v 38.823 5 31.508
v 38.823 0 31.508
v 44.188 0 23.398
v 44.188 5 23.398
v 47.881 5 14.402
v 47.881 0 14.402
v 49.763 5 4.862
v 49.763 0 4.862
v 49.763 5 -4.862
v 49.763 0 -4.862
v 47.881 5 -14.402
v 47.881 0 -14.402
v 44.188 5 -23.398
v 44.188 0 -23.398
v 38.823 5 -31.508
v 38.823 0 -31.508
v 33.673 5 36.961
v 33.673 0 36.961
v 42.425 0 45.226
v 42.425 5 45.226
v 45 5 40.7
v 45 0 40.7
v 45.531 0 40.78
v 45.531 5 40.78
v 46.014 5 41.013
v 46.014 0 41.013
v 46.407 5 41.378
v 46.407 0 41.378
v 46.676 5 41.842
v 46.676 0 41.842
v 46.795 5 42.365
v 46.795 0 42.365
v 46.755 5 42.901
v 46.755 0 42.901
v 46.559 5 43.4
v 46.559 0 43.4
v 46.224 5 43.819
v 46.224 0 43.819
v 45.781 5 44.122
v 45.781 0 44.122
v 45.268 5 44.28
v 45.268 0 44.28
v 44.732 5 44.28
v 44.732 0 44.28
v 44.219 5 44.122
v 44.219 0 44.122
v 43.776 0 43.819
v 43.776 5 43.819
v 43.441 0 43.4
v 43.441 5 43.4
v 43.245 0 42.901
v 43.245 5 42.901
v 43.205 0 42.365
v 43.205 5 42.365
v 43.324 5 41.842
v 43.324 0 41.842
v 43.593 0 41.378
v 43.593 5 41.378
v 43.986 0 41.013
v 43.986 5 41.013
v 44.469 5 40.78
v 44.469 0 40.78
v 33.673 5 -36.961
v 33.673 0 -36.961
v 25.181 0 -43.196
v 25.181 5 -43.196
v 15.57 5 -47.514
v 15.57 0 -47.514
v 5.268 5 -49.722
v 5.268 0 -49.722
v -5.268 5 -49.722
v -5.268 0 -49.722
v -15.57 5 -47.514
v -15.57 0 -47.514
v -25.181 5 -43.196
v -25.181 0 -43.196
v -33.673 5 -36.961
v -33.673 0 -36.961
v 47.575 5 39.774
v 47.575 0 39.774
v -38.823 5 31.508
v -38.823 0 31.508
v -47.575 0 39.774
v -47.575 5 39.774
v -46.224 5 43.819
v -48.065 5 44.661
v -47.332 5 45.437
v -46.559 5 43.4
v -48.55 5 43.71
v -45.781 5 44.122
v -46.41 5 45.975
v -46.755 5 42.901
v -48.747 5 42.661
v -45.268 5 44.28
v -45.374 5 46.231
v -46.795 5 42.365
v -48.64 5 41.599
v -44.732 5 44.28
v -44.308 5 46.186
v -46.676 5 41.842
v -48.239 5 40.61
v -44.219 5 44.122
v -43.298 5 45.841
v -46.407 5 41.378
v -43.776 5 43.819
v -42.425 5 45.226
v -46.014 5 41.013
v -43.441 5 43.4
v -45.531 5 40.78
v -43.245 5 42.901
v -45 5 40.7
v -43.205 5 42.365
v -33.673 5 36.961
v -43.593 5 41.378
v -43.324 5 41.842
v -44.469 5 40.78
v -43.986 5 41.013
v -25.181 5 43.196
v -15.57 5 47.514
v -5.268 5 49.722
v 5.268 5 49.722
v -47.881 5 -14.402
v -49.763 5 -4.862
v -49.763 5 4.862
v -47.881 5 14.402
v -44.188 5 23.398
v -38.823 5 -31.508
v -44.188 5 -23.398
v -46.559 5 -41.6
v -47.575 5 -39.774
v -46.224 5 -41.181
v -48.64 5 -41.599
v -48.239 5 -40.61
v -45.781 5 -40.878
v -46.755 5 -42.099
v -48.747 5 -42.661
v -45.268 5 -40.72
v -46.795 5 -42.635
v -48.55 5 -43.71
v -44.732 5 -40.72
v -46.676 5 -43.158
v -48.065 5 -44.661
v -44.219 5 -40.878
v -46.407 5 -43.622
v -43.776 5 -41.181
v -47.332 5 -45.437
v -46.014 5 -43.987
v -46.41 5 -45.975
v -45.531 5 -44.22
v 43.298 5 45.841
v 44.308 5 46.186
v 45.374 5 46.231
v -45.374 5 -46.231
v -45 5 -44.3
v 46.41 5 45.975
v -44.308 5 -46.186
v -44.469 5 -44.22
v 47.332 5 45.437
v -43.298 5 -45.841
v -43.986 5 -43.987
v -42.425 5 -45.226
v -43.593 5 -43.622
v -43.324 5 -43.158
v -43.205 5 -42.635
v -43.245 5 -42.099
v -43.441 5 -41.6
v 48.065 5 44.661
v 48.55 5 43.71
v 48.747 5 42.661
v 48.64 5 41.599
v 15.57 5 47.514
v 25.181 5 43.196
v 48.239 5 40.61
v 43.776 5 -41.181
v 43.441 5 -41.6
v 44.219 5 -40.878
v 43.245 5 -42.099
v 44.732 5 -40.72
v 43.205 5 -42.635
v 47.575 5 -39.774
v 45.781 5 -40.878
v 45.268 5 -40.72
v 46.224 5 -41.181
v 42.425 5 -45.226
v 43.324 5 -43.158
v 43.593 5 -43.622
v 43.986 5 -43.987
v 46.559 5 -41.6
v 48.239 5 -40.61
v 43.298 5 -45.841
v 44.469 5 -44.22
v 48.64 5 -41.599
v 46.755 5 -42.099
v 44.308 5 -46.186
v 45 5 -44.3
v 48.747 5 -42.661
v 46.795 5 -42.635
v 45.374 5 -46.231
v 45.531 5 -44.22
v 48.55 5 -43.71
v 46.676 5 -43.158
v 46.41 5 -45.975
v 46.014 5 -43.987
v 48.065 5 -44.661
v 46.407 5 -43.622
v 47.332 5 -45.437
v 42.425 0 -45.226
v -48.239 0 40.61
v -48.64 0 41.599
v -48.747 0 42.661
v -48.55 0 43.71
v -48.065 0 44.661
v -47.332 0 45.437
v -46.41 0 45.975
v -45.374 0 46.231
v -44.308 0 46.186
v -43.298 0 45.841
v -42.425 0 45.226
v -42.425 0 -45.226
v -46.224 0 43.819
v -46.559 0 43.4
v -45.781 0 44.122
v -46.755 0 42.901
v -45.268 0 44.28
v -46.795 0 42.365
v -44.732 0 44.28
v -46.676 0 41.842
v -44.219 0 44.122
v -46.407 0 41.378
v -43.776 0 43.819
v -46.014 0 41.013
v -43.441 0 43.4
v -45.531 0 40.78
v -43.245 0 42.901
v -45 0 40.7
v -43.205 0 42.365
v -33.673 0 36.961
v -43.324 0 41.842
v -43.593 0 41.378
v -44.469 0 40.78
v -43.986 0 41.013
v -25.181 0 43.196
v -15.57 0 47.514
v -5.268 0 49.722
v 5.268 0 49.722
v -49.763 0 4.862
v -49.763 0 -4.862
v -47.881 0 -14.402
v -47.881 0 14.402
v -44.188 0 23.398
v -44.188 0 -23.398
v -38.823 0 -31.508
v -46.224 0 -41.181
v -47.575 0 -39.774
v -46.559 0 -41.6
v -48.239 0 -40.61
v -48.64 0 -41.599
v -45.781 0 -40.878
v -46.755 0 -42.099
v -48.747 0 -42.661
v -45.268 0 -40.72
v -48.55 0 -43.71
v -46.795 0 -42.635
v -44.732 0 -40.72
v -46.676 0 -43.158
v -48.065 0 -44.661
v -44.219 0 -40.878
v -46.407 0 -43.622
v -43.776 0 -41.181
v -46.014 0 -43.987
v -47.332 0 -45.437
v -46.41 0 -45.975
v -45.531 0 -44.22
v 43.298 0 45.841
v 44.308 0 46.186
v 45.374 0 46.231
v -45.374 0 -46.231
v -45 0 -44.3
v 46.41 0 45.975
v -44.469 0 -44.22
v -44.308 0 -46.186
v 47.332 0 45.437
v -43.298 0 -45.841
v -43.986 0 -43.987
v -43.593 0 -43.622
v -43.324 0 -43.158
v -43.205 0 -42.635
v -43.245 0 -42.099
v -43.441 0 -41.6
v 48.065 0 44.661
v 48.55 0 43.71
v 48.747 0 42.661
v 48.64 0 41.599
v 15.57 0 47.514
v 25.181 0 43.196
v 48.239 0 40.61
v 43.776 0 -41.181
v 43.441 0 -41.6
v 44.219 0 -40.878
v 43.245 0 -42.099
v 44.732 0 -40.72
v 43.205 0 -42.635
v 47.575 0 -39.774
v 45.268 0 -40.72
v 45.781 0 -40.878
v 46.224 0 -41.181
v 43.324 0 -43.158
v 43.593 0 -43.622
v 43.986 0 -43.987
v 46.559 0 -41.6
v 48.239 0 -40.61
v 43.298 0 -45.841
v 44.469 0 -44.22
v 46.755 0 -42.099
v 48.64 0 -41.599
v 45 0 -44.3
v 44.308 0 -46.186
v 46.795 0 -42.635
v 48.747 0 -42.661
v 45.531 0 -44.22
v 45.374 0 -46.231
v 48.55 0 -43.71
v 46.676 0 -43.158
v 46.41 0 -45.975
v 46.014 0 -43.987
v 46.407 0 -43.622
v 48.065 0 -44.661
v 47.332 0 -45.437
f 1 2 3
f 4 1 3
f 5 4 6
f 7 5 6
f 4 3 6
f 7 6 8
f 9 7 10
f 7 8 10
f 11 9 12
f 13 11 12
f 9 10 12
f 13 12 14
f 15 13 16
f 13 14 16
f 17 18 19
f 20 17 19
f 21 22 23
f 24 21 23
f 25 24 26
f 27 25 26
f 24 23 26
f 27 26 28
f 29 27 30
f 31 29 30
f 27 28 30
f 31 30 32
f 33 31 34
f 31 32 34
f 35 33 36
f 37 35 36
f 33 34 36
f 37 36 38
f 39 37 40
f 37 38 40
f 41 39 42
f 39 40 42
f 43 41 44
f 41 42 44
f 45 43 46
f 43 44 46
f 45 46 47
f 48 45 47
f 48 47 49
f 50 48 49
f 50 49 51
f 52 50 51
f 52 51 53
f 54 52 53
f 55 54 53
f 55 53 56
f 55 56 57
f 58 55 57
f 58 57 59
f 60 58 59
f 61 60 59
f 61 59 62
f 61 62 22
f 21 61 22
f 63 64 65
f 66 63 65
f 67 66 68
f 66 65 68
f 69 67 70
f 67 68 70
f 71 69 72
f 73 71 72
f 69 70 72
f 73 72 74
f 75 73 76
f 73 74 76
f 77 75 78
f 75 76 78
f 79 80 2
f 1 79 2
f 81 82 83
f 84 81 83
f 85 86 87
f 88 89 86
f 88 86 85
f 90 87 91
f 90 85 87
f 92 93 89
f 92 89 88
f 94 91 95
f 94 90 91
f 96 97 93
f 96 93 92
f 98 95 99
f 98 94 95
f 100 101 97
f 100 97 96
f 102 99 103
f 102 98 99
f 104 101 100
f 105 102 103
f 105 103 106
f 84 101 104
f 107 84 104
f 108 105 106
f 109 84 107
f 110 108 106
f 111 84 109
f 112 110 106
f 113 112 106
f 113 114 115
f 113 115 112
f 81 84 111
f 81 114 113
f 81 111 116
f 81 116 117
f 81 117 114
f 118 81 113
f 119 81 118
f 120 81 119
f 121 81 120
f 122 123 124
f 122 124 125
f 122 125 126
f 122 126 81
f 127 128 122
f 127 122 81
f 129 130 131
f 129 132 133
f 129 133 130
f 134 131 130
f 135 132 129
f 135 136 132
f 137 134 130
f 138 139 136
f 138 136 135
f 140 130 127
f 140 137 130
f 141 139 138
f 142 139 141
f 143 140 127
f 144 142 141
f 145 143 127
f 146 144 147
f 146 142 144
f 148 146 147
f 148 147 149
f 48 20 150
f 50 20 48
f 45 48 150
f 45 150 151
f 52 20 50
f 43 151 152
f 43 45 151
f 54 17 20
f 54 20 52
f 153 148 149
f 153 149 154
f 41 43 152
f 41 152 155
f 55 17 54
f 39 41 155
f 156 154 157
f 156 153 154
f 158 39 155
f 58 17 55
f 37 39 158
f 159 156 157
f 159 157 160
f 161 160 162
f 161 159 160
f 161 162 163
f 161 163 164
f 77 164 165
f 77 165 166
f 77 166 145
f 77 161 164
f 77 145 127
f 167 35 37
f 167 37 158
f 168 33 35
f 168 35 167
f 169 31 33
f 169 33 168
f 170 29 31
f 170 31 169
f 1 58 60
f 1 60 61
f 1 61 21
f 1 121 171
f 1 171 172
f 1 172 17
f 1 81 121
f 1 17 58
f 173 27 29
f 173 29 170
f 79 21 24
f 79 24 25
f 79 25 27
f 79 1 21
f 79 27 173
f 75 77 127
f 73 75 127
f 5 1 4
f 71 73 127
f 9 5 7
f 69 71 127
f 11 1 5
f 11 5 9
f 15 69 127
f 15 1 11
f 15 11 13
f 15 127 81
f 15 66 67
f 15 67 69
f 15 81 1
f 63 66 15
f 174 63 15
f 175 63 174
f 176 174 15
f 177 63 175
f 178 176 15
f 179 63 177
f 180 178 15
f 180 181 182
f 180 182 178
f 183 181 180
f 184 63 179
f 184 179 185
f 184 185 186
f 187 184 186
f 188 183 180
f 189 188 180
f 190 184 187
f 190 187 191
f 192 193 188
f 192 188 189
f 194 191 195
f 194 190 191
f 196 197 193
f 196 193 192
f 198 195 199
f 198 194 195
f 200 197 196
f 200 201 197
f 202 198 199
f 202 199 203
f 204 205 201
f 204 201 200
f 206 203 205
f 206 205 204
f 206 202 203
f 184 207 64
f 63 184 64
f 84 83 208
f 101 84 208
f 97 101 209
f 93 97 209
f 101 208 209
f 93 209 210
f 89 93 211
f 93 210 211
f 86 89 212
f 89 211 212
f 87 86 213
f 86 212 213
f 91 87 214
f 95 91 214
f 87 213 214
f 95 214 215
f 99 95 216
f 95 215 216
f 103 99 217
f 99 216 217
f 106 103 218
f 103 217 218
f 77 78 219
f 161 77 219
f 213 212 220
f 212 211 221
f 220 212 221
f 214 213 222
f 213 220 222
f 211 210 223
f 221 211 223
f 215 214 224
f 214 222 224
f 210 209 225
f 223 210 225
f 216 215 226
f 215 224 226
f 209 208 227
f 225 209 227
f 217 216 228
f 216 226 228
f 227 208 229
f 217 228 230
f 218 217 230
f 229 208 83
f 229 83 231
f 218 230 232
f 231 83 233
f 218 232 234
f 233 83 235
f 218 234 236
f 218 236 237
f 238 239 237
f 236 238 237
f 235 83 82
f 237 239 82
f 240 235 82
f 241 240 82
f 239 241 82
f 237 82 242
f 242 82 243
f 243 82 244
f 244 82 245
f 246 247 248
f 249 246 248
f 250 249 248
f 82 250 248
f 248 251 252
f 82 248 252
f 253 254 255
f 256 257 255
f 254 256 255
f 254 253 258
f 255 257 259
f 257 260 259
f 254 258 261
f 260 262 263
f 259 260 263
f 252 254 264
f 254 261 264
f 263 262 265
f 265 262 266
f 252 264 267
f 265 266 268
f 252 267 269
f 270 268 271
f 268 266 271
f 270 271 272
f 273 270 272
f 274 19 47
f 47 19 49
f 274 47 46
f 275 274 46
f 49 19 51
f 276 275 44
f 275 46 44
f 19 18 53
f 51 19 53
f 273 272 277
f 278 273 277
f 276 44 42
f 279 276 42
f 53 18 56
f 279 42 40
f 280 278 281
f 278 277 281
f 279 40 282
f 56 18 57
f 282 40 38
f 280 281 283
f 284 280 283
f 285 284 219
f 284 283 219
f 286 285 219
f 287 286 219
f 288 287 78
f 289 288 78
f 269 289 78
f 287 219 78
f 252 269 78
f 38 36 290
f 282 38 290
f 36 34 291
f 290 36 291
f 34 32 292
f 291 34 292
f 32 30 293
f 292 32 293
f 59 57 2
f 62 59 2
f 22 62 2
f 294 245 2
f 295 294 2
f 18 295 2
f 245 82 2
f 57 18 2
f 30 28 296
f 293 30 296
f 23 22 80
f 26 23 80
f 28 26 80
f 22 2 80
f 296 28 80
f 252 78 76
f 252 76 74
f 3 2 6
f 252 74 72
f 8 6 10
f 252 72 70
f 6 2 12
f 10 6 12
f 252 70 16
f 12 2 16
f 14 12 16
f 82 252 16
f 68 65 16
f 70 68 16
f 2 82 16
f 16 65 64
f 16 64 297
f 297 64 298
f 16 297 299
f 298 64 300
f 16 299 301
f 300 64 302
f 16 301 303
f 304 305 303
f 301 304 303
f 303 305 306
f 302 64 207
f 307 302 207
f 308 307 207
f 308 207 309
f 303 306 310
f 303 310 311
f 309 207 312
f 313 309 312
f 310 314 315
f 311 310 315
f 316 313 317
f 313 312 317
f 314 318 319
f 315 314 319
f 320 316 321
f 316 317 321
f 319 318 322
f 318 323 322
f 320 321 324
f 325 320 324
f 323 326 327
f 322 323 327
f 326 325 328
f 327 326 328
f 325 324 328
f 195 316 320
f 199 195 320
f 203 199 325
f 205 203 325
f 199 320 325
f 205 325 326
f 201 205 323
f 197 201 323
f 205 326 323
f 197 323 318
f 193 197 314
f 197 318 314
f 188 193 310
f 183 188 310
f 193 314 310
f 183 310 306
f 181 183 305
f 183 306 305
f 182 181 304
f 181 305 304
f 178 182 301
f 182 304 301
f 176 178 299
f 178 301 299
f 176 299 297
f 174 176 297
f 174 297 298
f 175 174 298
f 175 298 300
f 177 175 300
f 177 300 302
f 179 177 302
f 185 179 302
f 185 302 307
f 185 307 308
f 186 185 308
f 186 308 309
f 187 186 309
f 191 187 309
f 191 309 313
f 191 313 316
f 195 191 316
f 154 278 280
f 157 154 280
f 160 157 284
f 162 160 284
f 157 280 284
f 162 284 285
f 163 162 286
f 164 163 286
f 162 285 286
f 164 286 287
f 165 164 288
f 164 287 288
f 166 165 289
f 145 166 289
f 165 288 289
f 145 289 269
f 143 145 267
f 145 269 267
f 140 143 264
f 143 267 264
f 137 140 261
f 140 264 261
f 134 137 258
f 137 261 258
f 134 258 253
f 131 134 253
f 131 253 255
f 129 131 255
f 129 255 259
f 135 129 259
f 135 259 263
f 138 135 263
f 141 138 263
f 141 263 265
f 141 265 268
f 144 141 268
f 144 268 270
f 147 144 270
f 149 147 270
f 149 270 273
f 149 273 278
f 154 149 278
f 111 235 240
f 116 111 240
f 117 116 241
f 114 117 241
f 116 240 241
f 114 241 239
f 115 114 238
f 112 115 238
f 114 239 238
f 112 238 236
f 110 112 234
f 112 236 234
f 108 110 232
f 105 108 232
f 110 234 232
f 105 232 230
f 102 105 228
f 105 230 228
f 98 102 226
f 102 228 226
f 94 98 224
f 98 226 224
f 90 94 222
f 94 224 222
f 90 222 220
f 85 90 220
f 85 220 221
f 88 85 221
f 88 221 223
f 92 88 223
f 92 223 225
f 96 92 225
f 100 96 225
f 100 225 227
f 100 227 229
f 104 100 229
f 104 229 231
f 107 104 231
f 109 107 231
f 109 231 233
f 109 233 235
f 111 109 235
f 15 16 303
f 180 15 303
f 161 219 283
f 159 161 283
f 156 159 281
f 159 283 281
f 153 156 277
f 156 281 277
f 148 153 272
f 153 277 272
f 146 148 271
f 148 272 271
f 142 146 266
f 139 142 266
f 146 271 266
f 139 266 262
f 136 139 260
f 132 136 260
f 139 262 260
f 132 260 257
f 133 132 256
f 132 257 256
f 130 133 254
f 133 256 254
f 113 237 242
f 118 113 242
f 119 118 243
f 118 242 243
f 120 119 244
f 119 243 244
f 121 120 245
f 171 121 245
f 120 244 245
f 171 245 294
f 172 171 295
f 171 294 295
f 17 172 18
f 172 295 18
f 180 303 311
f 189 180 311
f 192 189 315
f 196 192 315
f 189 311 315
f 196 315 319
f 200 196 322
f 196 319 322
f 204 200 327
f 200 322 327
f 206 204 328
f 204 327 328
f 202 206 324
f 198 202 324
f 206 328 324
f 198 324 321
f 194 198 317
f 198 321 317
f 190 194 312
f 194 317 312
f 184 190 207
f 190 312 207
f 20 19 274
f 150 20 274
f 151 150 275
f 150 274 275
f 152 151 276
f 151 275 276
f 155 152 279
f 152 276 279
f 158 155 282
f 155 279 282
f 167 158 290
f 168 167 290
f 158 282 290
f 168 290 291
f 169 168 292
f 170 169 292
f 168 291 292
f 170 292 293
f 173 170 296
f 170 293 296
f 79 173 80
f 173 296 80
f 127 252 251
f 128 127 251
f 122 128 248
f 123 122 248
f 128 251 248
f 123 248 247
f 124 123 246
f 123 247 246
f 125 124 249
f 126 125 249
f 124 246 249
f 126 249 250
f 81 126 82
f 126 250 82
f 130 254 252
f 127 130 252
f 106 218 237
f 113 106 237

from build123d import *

# Parameters (mm, degrees)
BOSS_EXTRU_1_DEPTH = 5
D_GAGEMENT_M31_D   = 3.6


with BuildPart() as part:
    # Esquisse1 → Boss.-Extru.1 (new body)
    with BuildSketch(Plane(origin=(0, 0, 0), x_dir=(1, 0, 0), z_dir=(0, 1, 0))):
        with BuildLine():
            Line((-47.574838249, 39.773700678), (-38.823115476, 31.508184726))
            ThreePointArc((-38.823115476, 31.508184726), (-50, 0), (-38.823115476, -31.508184726))
            Line((-38.823115476, -31.508184726), (-47.574838249, -39.773700678))
            ThreePointArc((-47.574838249, -39.773700678), (-47.726299322, -45.074838249), (-42.425161751, -45.226299322))
            Line((-42.425161751, -45.226299322), (-33.673438979, -36.96078337))
            ThreePointArc((-33.673438979, -36.96078337), (0, -50), (33.673438979, -36.96078337))
            Line((33.673438979, -36.96078337), (42.425161751, -45.226299322))
            ThreePointArc((42.425161751, -45.226299322), (47.726299322, -45.074838249), (47.574838249, -39.773700678))
            Line((47.574838249, -39.773700678), (38.823115476, -31.508184726))
            ThreePointArc((38.823115476, -31.508184726), (50, 0), (38.823115476, 31.508184726))
            Line((38.823115476, 31.508184726), (47.574838249, 39.773700678))
            ThreePointArc((47.574838249, 39.773700678), (47.726299322, 45.074838249), (42.425161751, 45.226299322))
            Line((42.425161751, 45.226299322), (33.673438979, 36.96078337))
            ThreePointArc((33.673438979, 36.96078337), (0, 50), (-33.673438979, 36.96078337))
            Line((-33.673438979, 36.96078337), (-42.425161751, 45.226299322))
            ThreePointArc((-42.425161751, 45.226299322), (-47.726299322, 45.074838249), (-47.574838249, 39.773700678))
        make_face()
    extrude(amount=BOSS_EXTRU_1_DEPTH)

    # Dégagement M31 (through all)
    with Locations(Plane(origin=(-45, 5, 42.5), x_dir=(0, 0, 1), z_dir=(0, 1, 0))):
        with Locations((0, 0), (-85, 0), (-85, 90), (0, 90)):
            Hole(D_GAGEMENT_M31_D / 2)


solid = part.part
